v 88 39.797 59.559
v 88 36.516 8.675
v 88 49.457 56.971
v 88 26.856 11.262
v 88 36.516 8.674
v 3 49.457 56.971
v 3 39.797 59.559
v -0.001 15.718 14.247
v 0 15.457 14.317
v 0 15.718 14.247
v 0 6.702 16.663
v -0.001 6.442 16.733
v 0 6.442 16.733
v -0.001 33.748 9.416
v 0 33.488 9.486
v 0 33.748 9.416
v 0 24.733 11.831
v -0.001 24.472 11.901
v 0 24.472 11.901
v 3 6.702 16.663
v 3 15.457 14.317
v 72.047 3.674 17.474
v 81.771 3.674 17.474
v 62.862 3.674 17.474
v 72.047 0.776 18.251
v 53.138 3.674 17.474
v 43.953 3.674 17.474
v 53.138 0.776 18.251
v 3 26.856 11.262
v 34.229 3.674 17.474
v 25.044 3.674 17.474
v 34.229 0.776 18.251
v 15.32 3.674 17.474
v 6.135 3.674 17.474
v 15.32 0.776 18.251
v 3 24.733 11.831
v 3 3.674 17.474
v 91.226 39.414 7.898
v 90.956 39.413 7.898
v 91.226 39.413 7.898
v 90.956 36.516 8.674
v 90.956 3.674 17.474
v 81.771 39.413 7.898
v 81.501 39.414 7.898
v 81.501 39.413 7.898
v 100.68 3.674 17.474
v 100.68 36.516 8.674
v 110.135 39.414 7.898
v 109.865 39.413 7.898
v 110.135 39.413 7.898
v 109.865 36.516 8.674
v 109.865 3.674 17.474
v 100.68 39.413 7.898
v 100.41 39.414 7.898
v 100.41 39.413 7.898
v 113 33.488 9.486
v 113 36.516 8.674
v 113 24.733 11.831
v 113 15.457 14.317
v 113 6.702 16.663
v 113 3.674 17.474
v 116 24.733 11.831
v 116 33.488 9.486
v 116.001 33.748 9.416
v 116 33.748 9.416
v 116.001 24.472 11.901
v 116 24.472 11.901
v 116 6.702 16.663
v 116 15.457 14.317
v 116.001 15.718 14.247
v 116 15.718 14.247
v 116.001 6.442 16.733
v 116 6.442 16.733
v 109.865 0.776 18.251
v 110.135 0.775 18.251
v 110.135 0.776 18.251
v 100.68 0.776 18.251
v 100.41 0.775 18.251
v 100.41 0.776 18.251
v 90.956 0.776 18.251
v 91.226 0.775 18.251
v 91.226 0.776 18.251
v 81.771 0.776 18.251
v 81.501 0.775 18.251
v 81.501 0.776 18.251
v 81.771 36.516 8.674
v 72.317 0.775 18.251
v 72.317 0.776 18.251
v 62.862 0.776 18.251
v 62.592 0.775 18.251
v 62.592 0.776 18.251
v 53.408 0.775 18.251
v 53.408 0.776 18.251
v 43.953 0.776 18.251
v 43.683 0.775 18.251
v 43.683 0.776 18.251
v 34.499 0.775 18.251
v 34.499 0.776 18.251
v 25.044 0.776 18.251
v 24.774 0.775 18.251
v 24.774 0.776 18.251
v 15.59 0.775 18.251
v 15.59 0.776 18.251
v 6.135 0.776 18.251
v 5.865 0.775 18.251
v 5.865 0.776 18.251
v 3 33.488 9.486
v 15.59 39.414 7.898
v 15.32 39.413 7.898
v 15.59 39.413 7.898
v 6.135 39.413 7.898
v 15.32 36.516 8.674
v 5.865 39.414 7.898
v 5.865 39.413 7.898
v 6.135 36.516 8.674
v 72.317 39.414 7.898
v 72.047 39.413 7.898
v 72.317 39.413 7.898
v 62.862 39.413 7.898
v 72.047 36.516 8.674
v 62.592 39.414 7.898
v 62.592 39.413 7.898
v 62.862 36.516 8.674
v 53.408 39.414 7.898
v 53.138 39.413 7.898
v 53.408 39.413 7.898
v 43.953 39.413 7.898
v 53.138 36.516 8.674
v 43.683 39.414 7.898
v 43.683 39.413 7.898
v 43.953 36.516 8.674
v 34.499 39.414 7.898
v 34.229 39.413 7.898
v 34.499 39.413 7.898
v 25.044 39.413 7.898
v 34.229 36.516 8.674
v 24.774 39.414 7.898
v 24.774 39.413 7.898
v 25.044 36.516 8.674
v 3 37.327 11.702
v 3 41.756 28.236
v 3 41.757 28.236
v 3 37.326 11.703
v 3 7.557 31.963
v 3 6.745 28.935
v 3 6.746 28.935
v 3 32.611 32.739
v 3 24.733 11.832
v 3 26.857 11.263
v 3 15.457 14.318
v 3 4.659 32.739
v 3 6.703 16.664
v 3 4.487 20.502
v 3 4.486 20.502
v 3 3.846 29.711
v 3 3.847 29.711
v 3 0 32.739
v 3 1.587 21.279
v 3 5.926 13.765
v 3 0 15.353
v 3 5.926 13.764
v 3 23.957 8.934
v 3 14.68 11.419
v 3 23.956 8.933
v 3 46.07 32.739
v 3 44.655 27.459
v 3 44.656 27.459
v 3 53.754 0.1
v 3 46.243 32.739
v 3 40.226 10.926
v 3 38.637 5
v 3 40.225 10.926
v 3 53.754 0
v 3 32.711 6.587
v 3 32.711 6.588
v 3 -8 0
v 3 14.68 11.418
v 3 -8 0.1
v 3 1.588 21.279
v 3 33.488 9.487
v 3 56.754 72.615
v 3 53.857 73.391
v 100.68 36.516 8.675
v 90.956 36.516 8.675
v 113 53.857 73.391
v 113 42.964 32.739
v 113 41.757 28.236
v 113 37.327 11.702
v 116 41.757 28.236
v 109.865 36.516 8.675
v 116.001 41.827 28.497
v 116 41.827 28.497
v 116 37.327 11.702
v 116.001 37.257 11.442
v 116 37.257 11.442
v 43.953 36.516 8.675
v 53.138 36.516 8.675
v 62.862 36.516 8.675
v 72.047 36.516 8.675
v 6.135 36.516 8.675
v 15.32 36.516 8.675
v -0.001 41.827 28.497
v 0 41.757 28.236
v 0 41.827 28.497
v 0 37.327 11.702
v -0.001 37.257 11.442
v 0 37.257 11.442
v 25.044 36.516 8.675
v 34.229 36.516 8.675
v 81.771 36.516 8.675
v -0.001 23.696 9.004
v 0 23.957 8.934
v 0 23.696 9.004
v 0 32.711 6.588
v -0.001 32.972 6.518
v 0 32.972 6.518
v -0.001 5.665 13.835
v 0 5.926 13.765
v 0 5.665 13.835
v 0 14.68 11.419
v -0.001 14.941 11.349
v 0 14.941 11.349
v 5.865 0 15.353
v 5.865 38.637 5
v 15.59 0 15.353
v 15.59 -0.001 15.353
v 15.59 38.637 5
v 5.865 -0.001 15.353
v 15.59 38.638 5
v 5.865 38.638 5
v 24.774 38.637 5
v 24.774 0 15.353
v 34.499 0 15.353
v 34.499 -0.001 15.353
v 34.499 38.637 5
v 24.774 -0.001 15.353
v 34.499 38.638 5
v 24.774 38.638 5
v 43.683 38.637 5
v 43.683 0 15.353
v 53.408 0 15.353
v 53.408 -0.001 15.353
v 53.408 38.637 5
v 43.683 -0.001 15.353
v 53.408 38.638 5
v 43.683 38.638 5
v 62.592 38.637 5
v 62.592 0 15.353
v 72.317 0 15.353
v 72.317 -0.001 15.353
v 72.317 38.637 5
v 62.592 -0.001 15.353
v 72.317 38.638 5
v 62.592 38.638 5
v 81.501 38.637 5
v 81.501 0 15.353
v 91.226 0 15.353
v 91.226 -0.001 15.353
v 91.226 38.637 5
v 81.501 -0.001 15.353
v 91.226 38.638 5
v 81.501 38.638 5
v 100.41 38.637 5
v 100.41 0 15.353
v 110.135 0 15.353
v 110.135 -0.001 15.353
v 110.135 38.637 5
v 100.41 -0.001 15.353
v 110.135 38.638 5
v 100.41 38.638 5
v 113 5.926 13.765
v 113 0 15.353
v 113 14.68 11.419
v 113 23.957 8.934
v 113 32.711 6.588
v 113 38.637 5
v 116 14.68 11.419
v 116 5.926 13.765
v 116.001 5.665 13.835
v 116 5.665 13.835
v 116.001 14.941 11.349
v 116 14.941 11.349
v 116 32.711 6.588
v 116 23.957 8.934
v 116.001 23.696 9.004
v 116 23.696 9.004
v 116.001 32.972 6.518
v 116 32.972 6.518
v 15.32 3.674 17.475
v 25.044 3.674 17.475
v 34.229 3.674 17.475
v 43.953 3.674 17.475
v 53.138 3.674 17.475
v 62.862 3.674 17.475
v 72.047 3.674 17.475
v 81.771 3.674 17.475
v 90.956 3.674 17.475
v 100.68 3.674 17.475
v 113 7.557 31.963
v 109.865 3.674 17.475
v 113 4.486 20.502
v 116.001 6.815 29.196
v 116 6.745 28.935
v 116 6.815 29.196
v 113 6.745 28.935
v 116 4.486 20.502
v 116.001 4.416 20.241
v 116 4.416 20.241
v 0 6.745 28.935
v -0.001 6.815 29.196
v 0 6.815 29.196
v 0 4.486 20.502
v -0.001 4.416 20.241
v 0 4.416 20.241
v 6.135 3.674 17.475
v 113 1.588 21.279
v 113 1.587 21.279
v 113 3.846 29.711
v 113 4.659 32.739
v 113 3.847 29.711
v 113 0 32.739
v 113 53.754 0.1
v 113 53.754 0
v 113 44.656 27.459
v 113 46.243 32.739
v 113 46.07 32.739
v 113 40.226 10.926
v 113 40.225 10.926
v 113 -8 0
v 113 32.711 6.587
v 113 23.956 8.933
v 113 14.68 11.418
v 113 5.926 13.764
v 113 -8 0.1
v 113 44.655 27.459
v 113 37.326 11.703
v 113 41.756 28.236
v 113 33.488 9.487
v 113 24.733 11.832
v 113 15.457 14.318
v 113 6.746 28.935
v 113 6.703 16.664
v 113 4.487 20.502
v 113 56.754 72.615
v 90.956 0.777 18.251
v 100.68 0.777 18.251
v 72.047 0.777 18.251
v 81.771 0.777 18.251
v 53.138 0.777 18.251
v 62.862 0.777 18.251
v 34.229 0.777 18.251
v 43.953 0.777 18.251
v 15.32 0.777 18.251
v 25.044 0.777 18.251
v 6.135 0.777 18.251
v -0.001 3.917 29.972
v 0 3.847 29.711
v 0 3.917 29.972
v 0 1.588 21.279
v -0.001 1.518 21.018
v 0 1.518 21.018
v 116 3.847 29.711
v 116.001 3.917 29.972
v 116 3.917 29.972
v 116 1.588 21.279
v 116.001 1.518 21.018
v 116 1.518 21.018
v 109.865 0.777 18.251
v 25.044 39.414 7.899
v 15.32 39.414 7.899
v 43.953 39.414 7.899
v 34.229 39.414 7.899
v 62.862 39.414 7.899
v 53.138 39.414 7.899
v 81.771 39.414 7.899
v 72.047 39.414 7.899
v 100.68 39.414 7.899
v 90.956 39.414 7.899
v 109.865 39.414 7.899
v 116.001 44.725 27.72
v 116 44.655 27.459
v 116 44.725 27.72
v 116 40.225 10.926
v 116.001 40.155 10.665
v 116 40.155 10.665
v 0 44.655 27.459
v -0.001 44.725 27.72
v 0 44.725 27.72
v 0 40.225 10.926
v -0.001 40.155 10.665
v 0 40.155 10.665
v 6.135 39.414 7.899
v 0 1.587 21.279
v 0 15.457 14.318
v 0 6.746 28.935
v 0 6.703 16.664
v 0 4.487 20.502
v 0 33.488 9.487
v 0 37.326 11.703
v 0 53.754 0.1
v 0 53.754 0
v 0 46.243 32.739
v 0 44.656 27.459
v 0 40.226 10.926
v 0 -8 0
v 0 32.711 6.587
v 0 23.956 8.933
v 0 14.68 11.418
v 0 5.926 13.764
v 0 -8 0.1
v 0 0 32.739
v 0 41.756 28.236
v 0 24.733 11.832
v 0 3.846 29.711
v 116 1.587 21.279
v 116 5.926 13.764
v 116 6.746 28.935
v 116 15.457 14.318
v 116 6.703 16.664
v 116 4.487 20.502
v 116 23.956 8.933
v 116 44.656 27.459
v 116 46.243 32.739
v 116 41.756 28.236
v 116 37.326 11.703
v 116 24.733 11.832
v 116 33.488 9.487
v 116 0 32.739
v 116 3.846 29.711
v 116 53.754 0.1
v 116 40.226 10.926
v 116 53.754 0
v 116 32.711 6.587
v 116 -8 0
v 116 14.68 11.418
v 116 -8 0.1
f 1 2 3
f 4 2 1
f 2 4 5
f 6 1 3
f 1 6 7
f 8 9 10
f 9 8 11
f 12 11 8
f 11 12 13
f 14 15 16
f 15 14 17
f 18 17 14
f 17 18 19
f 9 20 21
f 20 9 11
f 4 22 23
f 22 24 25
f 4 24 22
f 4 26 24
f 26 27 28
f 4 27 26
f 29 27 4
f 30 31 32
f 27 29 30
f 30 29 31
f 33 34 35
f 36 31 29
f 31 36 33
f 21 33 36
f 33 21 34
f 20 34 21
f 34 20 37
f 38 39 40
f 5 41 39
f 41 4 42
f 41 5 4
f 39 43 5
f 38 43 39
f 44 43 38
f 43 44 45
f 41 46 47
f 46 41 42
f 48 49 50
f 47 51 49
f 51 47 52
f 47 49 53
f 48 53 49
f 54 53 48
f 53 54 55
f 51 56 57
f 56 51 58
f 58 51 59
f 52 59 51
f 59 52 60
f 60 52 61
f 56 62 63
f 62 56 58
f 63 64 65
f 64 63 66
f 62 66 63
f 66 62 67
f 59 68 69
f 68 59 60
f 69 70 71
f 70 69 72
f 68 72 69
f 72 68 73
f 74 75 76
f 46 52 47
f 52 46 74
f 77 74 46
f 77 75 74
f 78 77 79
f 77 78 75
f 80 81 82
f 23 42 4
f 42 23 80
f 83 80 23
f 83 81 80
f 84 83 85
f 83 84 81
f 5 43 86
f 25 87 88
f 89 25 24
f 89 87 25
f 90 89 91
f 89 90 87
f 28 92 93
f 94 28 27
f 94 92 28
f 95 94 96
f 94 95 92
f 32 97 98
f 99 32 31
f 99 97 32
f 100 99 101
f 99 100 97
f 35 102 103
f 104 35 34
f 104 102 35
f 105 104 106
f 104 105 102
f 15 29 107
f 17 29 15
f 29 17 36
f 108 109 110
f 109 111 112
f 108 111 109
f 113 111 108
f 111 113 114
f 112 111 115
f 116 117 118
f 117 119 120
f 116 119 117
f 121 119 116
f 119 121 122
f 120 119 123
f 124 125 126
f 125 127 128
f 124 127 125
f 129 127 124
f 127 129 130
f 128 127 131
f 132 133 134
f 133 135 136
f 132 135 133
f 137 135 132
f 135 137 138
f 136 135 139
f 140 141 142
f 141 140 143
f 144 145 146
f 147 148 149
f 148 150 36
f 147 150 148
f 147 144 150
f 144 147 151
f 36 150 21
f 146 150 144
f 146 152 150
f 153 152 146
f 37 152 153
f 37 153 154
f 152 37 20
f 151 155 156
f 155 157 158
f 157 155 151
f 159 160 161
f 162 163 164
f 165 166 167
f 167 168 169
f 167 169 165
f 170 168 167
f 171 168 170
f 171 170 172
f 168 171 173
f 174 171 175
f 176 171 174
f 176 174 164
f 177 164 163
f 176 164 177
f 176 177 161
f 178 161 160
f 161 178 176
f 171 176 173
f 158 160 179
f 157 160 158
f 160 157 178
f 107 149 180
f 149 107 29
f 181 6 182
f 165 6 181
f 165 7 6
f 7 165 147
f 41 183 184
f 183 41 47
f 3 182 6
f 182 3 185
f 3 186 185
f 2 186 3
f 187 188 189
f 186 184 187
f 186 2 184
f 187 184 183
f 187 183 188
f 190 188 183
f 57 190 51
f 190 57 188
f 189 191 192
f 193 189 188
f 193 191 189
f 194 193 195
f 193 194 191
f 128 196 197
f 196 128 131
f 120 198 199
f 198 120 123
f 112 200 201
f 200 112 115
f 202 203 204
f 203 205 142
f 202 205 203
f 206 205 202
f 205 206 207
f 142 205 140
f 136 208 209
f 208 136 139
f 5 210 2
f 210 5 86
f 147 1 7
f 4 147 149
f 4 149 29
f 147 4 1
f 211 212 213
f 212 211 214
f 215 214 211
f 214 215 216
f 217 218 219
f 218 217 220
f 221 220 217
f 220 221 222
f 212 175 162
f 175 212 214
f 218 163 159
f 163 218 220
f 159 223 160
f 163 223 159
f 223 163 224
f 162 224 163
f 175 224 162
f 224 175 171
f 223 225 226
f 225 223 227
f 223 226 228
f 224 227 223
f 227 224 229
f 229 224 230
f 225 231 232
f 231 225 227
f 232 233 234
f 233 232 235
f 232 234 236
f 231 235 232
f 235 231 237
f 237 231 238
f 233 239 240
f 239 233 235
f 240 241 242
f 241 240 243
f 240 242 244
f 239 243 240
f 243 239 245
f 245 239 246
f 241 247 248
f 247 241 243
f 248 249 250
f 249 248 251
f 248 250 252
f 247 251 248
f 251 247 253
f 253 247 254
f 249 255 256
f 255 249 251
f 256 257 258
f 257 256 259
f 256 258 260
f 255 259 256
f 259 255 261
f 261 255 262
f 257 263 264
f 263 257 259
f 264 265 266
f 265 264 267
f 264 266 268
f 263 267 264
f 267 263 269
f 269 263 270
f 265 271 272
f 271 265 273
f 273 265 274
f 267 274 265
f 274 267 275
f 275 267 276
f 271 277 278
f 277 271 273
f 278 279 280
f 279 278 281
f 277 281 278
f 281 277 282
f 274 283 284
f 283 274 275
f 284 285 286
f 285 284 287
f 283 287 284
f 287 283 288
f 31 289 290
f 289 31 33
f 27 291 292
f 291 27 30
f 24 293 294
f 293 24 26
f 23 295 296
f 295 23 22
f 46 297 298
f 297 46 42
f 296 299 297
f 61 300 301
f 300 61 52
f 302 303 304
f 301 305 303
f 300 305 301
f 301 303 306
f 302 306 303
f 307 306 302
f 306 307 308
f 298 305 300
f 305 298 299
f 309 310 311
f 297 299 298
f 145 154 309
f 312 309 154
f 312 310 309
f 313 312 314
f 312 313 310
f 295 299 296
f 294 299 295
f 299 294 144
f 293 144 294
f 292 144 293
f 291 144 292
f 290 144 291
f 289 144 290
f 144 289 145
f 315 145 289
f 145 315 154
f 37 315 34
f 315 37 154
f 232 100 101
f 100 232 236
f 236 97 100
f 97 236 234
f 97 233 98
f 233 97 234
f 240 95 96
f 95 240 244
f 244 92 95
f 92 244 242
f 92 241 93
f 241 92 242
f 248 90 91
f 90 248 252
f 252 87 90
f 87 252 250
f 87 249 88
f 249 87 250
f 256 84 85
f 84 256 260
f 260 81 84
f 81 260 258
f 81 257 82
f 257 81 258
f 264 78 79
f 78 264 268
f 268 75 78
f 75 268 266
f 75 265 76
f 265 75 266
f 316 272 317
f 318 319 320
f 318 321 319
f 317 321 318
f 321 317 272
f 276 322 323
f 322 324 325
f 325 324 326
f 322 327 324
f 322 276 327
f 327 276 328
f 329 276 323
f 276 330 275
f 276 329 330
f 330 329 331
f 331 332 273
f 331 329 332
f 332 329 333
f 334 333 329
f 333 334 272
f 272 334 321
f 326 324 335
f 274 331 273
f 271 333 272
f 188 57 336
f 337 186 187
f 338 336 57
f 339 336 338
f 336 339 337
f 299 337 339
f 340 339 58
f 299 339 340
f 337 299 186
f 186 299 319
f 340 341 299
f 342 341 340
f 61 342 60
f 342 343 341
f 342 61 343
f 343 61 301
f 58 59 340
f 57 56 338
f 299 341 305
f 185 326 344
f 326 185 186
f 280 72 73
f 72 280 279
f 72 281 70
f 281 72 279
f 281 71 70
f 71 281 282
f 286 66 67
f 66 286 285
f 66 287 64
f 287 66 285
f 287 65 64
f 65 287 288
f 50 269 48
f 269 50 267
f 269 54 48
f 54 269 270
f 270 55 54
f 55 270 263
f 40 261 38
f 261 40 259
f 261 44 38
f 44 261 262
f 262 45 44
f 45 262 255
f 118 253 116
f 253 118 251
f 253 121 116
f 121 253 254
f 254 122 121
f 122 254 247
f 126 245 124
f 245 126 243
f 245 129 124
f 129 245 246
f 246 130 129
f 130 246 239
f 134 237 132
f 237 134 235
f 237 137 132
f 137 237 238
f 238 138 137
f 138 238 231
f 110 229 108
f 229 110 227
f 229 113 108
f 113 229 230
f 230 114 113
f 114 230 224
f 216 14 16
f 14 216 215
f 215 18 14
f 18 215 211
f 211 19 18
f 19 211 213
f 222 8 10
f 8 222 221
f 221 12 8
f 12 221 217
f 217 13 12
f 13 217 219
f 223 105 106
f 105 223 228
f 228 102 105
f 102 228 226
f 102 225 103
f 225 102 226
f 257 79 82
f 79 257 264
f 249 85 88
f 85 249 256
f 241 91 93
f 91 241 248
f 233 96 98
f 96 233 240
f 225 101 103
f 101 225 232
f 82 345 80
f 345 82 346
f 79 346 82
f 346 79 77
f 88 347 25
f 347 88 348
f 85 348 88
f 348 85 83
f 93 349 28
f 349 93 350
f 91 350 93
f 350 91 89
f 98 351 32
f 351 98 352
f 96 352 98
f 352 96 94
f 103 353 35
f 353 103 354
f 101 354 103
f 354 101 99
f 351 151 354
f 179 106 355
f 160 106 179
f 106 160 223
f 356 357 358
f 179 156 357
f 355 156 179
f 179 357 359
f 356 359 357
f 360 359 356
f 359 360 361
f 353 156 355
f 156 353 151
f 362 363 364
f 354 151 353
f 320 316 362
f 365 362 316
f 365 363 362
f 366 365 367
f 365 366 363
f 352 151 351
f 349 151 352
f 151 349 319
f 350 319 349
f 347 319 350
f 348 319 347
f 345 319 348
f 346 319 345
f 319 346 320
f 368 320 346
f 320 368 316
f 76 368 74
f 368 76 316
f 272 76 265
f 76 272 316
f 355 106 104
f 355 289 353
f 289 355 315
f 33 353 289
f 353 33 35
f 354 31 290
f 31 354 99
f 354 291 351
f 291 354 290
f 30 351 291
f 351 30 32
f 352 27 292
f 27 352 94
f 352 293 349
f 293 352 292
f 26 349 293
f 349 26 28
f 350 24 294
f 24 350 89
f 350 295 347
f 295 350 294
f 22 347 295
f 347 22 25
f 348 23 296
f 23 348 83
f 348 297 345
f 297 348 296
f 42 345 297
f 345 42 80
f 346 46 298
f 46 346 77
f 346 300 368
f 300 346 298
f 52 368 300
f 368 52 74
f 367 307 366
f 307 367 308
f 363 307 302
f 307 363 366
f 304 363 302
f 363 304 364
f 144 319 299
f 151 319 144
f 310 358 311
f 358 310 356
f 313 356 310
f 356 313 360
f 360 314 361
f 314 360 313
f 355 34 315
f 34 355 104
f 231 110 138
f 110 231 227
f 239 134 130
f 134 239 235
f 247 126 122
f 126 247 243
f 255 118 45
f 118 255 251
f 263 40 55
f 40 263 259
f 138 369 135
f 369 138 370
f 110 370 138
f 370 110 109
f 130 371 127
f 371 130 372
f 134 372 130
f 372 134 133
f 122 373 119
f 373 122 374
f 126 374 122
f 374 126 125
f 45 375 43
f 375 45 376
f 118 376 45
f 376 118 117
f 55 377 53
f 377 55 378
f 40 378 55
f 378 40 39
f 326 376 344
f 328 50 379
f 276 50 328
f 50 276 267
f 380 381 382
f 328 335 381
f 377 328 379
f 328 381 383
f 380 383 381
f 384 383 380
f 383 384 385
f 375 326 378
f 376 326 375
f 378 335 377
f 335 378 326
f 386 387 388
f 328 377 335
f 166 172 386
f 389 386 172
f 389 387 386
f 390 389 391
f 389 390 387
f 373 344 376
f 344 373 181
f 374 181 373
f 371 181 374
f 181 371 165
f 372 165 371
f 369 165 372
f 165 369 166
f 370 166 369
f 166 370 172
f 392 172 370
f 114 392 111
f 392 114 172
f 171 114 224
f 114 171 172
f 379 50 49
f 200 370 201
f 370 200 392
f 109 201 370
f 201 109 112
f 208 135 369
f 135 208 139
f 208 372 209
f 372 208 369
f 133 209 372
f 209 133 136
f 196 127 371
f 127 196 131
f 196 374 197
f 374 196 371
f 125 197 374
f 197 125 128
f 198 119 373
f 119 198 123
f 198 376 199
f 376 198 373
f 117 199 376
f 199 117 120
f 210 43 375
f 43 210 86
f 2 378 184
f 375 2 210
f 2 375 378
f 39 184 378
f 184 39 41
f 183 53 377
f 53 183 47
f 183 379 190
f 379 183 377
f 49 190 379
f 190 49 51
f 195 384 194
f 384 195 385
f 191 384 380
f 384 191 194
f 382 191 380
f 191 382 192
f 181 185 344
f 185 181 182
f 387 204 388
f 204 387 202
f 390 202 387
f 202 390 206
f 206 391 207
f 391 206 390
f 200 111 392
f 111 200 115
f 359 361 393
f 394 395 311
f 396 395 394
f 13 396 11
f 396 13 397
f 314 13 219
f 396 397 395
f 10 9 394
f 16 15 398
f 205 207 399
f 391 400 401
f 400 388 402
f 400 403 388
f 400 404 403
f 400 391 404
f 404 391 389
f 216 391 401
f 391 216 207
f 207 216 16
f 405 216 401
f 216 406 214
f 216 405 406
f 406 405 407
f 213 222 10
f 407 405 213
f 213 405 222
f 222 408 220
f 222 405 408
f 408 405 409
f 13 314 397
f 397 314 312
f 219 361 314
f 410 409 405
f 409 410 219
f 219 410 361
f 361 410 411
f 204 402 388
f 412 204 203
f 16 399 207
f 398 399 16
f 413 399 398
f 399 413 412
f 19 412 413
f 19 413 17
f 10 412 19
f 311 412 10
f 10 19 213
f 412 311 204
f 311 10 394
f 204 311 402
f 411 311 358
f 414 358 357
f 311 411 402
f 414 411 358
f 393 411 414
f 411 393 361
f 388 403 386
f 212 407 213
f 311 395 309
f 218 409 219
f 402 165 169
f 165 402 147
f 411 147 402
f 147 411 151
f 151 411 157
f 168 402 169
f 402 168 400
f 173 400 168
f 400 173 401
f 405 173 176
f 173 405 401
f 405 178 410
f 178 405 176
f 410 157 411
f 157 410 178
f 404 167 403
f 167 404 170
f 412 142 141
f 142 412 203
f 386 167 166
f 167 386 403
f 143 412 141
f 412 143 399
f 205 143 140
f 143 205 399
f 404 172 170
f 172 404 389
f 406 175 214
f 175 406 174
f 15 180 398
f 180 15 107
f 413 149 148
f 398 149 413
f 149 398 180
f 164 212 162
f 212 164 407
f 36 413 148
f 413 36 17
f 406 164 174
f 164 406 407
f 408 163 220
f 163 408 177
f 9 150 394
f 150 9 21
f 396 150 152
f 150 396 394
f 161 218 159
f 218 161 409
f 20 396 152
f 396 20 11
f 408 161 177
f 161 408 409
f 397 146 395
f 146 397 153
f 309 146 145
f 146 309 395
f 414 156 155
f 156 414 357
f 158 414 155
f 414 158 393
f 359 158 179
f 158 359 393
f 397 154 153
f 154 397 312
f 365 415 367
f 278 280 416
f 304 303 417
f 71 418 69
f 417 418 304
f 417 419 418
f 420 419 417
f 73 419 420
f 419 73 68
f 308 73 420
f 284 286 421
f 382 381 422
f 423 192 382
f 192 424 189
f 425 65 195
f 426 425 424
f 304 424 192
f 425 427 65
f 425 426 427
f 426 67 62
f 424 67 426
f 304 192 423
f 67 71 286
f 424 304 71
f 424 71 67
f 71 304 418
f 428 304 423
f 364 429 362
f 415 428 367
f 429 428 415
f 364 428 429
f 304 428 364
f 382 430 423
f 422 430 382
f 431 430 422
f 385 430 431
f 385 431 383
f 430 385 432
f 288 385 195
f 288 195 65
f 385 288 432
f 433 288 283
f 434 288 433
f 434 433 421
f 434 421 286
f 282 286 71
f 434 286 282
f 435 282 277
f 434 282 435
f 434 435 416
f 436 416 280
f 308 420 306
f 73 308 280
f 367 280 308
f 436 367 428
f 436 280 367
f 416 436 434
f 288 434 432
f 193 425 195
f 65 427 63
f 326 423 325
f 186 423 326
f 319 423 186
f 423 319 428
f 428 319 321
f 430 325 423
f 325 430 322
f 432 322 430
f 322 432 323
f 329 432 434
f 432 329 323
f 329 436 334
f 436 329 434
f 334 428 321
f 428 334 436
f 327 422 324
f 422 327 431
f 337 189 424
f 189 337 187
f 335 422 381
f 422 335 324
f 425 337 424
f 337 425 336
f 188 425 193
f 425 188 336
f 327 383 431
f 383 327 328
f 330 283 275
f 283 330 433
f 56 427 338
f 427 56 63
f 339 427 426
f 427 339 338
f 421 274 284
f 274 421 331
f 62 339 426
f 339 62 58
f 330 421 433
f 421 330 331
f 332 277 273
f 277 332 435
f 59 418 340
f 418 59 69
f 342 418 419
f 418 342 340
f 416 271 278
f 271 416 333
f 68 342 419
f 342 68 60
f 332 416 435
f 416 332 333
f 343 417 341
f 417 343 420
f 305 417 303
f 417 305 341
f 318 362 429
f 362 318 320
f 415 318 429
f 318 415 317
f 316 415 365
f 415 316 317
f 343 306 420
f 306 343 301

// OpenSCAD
th = 3;
cor = 0.27;
js = 3*th;
width = 110+2*th;
height = 150;
length = 40;
frontH = 15+th;
backH = 70;

floorH = 5;

angel = 15;
alpha = sin(angel)*length;
beta = cos(angel)*length;  
sideH = frontH+frontH*cos(angel)-2*th;
Q=0.001;
QQ=2*Q;
//render();
preview();
module render(){
    ground();
    t(0,-frontH-th,0)front();
    t(0,backH)back();
    t(-sideH-th-1)side();
    t(sideH+width)side();
}

module preview(){

    t(0,0,alpha+floorH)r(-angel,0,0){
    color([1,1,1])t(th,length-th-10,th)cube([85,10,50]);
        col()3D()ground();
        col()t(0,th)r(90,0,0)3D()front();
        col()t(0,length)r(90,0,0)3D()back();
    }
    col()t(th)r(0,-90)3D()side();
    col()t(width)r(0,-90)3D()side();
}
module 3D(){
    linear_extrude(height=th)children();
}
module side(){
    L = beta+sin(angel)*sideH;
    LL =  beta+sin(angel)*backH;
    H = floorH+alpha+cos(angel)*frontH;
    difference(){
    hull(){
        square([H,L]);
         t(0,-8)square([0.1,LL+5]);
    }
    t(alpha+floorH)r(0,0,angel){
        t(th)r(0,0,90)teeth(length,false);
        t(0,length-th)teeth(sideH,false);
        t(0,0)r(0,0,0)teeth(frontH+th,false);
    }   
}
}

module front(){    
    difference(){
        t(th)square([width-2*th,frontH]);
        teeth(width,false);
    }   
    t(th)r(0,0,90)teeth(frontH+th);
    t(width)r(0,0,90)teeth(frontH+th);
}

module ground(){
    t(th,th)square([width-2*th,length-2*th]);
    teeth(width);
    t(th)r(0,0,90)teeth(length);
    t(width)r(0,0,90)teeth(length);
    t(0,length-th)teeth(width);
}

module back(){
    difference(){
        t(th)square([width-2*th,backH]);
        teeth(width,false);      
    } 
      t(th)r(0,0,90)teeth(sideH); 
     t(width)r(0,0,90)teeth(sideH); 
}

module teeth(distance,teeth=true){
    margin = 4*th;
    dist = distance - margin;   
    N = floor(dist/(js));
    n = N+(N+1)%2;   
    JS = dist/n;
    cOffset = margin/2; 
    
    for(n=[0:1:n]){
         if(n%2==0)translate([JS*n + cOffset,0,0])pin(JS,teeth);
     }
}
module pin(JS,teeth=true){        
     if(teeth){
        translate([-cor/2,-Q])square([JS+cor,th+QQ]);
     }else{
          translate([cor/2,-Q])square([JS-cor,th+QQ]);
     }   
}

module t(x=0,y=0,z=0){
    translate([x,y,z])children();   
}
module r(x=0,y=0,z=0){
    rotate([x,y,z])children();
}
module 3D(){
    linear_extrude(height=th)children();
}

module col(){
    r = rands(1,100,3);   
    color([r[0]/100,r[1]/100,r[2]/100])children();
}
